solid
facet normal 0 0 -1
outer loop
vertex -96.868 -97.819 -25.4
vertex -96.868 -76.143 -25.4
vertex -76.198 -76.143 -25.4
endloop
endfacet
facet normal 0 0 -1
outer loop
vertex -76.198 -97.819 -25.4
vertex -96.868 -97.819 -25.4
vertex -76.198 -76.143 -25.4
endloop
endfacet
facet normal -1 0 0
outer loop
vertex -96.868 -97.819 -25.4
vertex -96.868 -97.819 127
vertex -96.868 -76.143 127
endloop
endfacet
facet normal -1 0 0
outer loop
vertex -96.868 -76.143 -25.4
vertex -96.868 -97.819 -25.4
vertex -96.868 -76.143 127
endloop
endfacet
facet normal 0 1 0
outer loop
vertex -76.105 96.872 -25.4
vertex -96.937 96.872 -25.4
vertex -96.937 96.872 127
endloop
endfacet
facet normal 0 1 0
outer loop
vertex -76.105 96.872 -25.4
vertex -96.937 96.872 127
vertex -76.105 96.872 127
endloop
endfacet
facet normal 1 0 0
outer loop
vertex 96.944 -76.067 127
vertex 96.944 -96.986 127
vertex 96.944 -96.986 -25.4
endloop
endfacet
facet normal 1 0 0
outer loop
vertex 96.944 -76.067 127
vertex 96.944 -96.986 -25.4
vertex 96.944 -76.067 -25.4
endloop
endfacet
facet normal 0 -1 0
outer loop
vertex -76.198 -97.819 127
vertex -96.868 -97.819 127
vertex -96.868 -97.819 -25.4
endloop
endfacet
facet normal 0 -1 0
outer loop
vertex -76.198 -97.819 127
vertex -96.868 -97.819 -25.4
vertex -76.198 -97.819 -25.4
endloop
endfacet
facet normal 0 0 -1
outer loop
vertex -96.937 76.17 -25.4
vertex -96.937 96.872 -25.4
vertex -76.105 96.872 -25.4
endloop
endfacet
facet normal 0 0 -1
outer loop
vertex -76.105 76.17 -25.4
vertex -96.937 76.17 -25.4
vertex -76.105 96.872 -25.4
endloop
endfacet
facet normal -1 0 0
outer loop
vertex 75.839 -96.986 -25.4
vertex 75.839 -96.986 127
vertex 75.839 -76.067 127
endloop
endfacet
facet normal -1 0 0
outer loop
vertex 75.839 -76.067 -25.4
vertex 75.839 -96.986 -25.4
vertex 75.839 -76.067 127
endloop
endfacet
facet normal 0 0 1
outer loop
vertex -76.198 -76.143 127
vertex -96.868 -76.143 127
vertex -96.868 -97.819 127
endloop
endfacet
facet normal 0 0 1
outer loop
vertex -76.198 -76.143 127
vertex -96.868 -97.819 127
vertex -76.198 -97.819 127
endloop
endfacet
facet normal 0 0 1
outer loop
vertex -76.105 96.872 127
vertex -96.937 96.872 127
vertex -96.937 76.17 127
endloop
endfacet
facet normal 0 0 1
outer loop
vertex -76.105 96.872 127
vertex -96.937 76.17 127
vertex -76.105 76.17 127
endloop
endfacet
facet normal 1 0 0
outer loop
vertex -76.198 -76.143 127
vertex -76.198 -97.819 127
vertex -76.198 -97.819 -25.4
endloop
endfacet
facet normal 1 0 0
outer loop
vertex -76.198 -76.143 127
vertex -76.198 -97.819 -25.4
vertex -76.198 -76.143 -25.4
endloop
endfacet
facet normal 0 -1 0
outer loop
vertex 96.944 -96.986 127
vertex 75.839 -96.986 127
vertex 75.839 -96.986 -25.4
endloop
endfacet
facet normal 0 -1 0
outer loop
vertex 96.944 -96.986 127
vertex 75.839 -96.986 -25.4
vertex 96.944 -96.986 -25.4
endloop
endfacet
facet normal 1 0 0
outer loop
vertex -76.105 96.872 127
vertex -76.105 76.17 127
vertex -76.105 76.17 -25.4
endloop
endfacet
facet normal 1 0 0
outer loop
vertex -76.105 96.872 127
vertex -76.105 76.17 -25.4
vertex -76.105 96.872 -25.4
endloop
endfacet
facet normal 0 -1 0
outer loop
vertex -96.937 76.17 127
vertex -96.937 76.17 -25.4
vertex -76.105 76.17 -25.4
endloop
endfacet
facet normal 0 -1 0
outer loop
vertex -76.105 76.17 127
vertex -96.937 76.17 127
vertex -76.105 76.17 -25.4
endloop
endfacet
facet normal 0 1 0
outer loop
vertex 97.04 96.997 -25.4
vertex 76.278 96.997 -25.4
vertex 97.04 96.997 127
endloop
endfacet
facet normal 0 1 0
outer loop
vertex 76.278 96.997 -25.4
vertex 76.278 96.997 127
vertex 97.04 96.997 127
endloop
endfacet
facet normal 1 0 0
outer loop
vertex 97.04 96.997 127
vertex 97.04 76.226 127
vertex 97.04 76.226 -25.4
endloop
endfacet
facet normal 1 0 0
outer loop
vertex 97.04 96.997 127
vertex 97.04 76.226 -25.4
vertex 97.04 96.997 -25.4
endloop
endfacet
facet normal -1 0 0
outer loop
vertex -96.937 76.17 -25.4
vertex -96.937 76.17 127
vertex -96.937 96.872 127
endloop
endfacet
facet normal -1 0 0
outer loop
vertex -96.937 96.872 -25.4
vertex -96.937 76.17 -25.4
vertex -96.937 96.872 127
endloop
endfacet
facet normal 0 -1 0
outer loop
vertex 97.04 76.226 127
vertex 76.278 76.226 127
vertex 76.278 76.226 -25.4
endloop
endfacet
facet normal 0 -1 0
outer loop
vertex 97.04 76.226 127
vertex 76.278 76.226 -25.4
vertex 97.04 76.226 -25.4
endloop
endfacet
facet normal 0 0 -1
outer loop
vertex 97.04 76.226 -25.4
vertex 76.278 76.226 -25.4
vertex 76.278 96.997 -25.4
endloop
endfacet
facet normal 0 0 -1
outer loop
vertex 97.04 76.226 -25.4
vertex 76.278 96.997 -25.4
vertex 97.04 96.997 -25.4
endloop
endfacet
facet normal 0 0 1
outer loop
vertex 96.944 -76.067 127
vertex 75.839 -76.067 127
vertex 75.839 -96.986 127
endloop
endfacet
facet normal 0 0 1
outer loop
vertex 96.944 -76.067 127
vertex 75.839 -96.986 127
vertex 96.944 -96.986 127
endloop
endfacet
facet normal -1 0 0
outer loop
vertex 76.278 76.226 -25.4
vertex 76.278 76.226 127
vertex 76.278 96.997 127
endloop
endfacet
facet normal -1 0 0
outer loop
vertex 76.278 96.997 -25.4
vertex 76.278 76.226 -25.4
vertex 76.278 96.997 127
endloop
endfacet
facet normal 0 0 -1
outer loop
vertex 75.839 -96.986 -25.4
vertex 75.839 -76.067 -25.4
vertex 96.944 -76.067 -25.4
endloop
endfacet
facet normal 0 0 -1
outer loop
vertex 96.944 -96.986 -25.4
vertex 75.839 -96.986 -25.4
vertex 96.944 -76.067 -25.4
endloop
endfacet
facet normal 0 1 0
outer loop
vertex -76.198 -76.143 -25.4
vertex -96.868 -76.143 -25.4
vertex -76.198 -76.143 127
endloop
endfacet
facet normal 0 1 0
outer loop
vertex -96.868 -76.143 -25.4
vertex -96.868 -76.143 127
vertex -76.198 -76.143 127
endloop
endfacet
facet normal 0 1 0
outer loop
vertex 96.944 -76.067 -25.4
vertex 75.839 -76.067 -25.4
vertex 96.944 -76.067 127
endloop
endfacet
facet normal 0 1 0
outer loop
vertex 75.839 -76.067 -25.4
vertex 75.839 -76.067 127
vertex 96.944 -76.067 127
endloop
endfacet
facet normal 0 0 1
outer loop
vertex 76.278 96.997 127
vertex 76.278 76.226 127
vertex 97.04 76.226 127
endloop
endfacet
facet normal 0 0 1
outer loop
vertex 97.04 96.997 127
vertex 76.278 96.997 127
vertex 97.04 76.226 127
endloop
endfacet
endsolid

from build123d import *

# Parameters (mm, degrees)
F0_W          = 20.832829
F0_H          = 20.70263
F0_W_2        = 21.104806
F0_H_2        = 20.919338
F0_W_3        = 20.670086
F0_H_3        = 21.67558
F0_W_4        = 20.761833
F0_H_4        = 20.770893
F1_DEPTH      = 127
F1_DEPTH_BACK = 25.4


with BuildPart() as f1:
    # F0 (on Top) → F1 (new body, two sides)
    with BuildSketch(Plane.XY) as f1_sk:
        with Locations((-86.521003, 86.520851)):
            Rectangle(F0_W, F0_H)
        with Locations((86.391192, -86.526819)):
            Rectangle(F0_W_2, F0_H_2)
        with Locations((-86.533248, -86.981263)):
            Rectangle(F0_W_3, F0_H_3)
        with Locations((86.65885, 86.611777)):
            Rectangle(F0_W_4, F0_H_4)
    extrude(amount=F1_DEPTH)
    extrude(f1_sk.sketch, amount=-F1_DEPTH_BACK)


solid = f1.part
